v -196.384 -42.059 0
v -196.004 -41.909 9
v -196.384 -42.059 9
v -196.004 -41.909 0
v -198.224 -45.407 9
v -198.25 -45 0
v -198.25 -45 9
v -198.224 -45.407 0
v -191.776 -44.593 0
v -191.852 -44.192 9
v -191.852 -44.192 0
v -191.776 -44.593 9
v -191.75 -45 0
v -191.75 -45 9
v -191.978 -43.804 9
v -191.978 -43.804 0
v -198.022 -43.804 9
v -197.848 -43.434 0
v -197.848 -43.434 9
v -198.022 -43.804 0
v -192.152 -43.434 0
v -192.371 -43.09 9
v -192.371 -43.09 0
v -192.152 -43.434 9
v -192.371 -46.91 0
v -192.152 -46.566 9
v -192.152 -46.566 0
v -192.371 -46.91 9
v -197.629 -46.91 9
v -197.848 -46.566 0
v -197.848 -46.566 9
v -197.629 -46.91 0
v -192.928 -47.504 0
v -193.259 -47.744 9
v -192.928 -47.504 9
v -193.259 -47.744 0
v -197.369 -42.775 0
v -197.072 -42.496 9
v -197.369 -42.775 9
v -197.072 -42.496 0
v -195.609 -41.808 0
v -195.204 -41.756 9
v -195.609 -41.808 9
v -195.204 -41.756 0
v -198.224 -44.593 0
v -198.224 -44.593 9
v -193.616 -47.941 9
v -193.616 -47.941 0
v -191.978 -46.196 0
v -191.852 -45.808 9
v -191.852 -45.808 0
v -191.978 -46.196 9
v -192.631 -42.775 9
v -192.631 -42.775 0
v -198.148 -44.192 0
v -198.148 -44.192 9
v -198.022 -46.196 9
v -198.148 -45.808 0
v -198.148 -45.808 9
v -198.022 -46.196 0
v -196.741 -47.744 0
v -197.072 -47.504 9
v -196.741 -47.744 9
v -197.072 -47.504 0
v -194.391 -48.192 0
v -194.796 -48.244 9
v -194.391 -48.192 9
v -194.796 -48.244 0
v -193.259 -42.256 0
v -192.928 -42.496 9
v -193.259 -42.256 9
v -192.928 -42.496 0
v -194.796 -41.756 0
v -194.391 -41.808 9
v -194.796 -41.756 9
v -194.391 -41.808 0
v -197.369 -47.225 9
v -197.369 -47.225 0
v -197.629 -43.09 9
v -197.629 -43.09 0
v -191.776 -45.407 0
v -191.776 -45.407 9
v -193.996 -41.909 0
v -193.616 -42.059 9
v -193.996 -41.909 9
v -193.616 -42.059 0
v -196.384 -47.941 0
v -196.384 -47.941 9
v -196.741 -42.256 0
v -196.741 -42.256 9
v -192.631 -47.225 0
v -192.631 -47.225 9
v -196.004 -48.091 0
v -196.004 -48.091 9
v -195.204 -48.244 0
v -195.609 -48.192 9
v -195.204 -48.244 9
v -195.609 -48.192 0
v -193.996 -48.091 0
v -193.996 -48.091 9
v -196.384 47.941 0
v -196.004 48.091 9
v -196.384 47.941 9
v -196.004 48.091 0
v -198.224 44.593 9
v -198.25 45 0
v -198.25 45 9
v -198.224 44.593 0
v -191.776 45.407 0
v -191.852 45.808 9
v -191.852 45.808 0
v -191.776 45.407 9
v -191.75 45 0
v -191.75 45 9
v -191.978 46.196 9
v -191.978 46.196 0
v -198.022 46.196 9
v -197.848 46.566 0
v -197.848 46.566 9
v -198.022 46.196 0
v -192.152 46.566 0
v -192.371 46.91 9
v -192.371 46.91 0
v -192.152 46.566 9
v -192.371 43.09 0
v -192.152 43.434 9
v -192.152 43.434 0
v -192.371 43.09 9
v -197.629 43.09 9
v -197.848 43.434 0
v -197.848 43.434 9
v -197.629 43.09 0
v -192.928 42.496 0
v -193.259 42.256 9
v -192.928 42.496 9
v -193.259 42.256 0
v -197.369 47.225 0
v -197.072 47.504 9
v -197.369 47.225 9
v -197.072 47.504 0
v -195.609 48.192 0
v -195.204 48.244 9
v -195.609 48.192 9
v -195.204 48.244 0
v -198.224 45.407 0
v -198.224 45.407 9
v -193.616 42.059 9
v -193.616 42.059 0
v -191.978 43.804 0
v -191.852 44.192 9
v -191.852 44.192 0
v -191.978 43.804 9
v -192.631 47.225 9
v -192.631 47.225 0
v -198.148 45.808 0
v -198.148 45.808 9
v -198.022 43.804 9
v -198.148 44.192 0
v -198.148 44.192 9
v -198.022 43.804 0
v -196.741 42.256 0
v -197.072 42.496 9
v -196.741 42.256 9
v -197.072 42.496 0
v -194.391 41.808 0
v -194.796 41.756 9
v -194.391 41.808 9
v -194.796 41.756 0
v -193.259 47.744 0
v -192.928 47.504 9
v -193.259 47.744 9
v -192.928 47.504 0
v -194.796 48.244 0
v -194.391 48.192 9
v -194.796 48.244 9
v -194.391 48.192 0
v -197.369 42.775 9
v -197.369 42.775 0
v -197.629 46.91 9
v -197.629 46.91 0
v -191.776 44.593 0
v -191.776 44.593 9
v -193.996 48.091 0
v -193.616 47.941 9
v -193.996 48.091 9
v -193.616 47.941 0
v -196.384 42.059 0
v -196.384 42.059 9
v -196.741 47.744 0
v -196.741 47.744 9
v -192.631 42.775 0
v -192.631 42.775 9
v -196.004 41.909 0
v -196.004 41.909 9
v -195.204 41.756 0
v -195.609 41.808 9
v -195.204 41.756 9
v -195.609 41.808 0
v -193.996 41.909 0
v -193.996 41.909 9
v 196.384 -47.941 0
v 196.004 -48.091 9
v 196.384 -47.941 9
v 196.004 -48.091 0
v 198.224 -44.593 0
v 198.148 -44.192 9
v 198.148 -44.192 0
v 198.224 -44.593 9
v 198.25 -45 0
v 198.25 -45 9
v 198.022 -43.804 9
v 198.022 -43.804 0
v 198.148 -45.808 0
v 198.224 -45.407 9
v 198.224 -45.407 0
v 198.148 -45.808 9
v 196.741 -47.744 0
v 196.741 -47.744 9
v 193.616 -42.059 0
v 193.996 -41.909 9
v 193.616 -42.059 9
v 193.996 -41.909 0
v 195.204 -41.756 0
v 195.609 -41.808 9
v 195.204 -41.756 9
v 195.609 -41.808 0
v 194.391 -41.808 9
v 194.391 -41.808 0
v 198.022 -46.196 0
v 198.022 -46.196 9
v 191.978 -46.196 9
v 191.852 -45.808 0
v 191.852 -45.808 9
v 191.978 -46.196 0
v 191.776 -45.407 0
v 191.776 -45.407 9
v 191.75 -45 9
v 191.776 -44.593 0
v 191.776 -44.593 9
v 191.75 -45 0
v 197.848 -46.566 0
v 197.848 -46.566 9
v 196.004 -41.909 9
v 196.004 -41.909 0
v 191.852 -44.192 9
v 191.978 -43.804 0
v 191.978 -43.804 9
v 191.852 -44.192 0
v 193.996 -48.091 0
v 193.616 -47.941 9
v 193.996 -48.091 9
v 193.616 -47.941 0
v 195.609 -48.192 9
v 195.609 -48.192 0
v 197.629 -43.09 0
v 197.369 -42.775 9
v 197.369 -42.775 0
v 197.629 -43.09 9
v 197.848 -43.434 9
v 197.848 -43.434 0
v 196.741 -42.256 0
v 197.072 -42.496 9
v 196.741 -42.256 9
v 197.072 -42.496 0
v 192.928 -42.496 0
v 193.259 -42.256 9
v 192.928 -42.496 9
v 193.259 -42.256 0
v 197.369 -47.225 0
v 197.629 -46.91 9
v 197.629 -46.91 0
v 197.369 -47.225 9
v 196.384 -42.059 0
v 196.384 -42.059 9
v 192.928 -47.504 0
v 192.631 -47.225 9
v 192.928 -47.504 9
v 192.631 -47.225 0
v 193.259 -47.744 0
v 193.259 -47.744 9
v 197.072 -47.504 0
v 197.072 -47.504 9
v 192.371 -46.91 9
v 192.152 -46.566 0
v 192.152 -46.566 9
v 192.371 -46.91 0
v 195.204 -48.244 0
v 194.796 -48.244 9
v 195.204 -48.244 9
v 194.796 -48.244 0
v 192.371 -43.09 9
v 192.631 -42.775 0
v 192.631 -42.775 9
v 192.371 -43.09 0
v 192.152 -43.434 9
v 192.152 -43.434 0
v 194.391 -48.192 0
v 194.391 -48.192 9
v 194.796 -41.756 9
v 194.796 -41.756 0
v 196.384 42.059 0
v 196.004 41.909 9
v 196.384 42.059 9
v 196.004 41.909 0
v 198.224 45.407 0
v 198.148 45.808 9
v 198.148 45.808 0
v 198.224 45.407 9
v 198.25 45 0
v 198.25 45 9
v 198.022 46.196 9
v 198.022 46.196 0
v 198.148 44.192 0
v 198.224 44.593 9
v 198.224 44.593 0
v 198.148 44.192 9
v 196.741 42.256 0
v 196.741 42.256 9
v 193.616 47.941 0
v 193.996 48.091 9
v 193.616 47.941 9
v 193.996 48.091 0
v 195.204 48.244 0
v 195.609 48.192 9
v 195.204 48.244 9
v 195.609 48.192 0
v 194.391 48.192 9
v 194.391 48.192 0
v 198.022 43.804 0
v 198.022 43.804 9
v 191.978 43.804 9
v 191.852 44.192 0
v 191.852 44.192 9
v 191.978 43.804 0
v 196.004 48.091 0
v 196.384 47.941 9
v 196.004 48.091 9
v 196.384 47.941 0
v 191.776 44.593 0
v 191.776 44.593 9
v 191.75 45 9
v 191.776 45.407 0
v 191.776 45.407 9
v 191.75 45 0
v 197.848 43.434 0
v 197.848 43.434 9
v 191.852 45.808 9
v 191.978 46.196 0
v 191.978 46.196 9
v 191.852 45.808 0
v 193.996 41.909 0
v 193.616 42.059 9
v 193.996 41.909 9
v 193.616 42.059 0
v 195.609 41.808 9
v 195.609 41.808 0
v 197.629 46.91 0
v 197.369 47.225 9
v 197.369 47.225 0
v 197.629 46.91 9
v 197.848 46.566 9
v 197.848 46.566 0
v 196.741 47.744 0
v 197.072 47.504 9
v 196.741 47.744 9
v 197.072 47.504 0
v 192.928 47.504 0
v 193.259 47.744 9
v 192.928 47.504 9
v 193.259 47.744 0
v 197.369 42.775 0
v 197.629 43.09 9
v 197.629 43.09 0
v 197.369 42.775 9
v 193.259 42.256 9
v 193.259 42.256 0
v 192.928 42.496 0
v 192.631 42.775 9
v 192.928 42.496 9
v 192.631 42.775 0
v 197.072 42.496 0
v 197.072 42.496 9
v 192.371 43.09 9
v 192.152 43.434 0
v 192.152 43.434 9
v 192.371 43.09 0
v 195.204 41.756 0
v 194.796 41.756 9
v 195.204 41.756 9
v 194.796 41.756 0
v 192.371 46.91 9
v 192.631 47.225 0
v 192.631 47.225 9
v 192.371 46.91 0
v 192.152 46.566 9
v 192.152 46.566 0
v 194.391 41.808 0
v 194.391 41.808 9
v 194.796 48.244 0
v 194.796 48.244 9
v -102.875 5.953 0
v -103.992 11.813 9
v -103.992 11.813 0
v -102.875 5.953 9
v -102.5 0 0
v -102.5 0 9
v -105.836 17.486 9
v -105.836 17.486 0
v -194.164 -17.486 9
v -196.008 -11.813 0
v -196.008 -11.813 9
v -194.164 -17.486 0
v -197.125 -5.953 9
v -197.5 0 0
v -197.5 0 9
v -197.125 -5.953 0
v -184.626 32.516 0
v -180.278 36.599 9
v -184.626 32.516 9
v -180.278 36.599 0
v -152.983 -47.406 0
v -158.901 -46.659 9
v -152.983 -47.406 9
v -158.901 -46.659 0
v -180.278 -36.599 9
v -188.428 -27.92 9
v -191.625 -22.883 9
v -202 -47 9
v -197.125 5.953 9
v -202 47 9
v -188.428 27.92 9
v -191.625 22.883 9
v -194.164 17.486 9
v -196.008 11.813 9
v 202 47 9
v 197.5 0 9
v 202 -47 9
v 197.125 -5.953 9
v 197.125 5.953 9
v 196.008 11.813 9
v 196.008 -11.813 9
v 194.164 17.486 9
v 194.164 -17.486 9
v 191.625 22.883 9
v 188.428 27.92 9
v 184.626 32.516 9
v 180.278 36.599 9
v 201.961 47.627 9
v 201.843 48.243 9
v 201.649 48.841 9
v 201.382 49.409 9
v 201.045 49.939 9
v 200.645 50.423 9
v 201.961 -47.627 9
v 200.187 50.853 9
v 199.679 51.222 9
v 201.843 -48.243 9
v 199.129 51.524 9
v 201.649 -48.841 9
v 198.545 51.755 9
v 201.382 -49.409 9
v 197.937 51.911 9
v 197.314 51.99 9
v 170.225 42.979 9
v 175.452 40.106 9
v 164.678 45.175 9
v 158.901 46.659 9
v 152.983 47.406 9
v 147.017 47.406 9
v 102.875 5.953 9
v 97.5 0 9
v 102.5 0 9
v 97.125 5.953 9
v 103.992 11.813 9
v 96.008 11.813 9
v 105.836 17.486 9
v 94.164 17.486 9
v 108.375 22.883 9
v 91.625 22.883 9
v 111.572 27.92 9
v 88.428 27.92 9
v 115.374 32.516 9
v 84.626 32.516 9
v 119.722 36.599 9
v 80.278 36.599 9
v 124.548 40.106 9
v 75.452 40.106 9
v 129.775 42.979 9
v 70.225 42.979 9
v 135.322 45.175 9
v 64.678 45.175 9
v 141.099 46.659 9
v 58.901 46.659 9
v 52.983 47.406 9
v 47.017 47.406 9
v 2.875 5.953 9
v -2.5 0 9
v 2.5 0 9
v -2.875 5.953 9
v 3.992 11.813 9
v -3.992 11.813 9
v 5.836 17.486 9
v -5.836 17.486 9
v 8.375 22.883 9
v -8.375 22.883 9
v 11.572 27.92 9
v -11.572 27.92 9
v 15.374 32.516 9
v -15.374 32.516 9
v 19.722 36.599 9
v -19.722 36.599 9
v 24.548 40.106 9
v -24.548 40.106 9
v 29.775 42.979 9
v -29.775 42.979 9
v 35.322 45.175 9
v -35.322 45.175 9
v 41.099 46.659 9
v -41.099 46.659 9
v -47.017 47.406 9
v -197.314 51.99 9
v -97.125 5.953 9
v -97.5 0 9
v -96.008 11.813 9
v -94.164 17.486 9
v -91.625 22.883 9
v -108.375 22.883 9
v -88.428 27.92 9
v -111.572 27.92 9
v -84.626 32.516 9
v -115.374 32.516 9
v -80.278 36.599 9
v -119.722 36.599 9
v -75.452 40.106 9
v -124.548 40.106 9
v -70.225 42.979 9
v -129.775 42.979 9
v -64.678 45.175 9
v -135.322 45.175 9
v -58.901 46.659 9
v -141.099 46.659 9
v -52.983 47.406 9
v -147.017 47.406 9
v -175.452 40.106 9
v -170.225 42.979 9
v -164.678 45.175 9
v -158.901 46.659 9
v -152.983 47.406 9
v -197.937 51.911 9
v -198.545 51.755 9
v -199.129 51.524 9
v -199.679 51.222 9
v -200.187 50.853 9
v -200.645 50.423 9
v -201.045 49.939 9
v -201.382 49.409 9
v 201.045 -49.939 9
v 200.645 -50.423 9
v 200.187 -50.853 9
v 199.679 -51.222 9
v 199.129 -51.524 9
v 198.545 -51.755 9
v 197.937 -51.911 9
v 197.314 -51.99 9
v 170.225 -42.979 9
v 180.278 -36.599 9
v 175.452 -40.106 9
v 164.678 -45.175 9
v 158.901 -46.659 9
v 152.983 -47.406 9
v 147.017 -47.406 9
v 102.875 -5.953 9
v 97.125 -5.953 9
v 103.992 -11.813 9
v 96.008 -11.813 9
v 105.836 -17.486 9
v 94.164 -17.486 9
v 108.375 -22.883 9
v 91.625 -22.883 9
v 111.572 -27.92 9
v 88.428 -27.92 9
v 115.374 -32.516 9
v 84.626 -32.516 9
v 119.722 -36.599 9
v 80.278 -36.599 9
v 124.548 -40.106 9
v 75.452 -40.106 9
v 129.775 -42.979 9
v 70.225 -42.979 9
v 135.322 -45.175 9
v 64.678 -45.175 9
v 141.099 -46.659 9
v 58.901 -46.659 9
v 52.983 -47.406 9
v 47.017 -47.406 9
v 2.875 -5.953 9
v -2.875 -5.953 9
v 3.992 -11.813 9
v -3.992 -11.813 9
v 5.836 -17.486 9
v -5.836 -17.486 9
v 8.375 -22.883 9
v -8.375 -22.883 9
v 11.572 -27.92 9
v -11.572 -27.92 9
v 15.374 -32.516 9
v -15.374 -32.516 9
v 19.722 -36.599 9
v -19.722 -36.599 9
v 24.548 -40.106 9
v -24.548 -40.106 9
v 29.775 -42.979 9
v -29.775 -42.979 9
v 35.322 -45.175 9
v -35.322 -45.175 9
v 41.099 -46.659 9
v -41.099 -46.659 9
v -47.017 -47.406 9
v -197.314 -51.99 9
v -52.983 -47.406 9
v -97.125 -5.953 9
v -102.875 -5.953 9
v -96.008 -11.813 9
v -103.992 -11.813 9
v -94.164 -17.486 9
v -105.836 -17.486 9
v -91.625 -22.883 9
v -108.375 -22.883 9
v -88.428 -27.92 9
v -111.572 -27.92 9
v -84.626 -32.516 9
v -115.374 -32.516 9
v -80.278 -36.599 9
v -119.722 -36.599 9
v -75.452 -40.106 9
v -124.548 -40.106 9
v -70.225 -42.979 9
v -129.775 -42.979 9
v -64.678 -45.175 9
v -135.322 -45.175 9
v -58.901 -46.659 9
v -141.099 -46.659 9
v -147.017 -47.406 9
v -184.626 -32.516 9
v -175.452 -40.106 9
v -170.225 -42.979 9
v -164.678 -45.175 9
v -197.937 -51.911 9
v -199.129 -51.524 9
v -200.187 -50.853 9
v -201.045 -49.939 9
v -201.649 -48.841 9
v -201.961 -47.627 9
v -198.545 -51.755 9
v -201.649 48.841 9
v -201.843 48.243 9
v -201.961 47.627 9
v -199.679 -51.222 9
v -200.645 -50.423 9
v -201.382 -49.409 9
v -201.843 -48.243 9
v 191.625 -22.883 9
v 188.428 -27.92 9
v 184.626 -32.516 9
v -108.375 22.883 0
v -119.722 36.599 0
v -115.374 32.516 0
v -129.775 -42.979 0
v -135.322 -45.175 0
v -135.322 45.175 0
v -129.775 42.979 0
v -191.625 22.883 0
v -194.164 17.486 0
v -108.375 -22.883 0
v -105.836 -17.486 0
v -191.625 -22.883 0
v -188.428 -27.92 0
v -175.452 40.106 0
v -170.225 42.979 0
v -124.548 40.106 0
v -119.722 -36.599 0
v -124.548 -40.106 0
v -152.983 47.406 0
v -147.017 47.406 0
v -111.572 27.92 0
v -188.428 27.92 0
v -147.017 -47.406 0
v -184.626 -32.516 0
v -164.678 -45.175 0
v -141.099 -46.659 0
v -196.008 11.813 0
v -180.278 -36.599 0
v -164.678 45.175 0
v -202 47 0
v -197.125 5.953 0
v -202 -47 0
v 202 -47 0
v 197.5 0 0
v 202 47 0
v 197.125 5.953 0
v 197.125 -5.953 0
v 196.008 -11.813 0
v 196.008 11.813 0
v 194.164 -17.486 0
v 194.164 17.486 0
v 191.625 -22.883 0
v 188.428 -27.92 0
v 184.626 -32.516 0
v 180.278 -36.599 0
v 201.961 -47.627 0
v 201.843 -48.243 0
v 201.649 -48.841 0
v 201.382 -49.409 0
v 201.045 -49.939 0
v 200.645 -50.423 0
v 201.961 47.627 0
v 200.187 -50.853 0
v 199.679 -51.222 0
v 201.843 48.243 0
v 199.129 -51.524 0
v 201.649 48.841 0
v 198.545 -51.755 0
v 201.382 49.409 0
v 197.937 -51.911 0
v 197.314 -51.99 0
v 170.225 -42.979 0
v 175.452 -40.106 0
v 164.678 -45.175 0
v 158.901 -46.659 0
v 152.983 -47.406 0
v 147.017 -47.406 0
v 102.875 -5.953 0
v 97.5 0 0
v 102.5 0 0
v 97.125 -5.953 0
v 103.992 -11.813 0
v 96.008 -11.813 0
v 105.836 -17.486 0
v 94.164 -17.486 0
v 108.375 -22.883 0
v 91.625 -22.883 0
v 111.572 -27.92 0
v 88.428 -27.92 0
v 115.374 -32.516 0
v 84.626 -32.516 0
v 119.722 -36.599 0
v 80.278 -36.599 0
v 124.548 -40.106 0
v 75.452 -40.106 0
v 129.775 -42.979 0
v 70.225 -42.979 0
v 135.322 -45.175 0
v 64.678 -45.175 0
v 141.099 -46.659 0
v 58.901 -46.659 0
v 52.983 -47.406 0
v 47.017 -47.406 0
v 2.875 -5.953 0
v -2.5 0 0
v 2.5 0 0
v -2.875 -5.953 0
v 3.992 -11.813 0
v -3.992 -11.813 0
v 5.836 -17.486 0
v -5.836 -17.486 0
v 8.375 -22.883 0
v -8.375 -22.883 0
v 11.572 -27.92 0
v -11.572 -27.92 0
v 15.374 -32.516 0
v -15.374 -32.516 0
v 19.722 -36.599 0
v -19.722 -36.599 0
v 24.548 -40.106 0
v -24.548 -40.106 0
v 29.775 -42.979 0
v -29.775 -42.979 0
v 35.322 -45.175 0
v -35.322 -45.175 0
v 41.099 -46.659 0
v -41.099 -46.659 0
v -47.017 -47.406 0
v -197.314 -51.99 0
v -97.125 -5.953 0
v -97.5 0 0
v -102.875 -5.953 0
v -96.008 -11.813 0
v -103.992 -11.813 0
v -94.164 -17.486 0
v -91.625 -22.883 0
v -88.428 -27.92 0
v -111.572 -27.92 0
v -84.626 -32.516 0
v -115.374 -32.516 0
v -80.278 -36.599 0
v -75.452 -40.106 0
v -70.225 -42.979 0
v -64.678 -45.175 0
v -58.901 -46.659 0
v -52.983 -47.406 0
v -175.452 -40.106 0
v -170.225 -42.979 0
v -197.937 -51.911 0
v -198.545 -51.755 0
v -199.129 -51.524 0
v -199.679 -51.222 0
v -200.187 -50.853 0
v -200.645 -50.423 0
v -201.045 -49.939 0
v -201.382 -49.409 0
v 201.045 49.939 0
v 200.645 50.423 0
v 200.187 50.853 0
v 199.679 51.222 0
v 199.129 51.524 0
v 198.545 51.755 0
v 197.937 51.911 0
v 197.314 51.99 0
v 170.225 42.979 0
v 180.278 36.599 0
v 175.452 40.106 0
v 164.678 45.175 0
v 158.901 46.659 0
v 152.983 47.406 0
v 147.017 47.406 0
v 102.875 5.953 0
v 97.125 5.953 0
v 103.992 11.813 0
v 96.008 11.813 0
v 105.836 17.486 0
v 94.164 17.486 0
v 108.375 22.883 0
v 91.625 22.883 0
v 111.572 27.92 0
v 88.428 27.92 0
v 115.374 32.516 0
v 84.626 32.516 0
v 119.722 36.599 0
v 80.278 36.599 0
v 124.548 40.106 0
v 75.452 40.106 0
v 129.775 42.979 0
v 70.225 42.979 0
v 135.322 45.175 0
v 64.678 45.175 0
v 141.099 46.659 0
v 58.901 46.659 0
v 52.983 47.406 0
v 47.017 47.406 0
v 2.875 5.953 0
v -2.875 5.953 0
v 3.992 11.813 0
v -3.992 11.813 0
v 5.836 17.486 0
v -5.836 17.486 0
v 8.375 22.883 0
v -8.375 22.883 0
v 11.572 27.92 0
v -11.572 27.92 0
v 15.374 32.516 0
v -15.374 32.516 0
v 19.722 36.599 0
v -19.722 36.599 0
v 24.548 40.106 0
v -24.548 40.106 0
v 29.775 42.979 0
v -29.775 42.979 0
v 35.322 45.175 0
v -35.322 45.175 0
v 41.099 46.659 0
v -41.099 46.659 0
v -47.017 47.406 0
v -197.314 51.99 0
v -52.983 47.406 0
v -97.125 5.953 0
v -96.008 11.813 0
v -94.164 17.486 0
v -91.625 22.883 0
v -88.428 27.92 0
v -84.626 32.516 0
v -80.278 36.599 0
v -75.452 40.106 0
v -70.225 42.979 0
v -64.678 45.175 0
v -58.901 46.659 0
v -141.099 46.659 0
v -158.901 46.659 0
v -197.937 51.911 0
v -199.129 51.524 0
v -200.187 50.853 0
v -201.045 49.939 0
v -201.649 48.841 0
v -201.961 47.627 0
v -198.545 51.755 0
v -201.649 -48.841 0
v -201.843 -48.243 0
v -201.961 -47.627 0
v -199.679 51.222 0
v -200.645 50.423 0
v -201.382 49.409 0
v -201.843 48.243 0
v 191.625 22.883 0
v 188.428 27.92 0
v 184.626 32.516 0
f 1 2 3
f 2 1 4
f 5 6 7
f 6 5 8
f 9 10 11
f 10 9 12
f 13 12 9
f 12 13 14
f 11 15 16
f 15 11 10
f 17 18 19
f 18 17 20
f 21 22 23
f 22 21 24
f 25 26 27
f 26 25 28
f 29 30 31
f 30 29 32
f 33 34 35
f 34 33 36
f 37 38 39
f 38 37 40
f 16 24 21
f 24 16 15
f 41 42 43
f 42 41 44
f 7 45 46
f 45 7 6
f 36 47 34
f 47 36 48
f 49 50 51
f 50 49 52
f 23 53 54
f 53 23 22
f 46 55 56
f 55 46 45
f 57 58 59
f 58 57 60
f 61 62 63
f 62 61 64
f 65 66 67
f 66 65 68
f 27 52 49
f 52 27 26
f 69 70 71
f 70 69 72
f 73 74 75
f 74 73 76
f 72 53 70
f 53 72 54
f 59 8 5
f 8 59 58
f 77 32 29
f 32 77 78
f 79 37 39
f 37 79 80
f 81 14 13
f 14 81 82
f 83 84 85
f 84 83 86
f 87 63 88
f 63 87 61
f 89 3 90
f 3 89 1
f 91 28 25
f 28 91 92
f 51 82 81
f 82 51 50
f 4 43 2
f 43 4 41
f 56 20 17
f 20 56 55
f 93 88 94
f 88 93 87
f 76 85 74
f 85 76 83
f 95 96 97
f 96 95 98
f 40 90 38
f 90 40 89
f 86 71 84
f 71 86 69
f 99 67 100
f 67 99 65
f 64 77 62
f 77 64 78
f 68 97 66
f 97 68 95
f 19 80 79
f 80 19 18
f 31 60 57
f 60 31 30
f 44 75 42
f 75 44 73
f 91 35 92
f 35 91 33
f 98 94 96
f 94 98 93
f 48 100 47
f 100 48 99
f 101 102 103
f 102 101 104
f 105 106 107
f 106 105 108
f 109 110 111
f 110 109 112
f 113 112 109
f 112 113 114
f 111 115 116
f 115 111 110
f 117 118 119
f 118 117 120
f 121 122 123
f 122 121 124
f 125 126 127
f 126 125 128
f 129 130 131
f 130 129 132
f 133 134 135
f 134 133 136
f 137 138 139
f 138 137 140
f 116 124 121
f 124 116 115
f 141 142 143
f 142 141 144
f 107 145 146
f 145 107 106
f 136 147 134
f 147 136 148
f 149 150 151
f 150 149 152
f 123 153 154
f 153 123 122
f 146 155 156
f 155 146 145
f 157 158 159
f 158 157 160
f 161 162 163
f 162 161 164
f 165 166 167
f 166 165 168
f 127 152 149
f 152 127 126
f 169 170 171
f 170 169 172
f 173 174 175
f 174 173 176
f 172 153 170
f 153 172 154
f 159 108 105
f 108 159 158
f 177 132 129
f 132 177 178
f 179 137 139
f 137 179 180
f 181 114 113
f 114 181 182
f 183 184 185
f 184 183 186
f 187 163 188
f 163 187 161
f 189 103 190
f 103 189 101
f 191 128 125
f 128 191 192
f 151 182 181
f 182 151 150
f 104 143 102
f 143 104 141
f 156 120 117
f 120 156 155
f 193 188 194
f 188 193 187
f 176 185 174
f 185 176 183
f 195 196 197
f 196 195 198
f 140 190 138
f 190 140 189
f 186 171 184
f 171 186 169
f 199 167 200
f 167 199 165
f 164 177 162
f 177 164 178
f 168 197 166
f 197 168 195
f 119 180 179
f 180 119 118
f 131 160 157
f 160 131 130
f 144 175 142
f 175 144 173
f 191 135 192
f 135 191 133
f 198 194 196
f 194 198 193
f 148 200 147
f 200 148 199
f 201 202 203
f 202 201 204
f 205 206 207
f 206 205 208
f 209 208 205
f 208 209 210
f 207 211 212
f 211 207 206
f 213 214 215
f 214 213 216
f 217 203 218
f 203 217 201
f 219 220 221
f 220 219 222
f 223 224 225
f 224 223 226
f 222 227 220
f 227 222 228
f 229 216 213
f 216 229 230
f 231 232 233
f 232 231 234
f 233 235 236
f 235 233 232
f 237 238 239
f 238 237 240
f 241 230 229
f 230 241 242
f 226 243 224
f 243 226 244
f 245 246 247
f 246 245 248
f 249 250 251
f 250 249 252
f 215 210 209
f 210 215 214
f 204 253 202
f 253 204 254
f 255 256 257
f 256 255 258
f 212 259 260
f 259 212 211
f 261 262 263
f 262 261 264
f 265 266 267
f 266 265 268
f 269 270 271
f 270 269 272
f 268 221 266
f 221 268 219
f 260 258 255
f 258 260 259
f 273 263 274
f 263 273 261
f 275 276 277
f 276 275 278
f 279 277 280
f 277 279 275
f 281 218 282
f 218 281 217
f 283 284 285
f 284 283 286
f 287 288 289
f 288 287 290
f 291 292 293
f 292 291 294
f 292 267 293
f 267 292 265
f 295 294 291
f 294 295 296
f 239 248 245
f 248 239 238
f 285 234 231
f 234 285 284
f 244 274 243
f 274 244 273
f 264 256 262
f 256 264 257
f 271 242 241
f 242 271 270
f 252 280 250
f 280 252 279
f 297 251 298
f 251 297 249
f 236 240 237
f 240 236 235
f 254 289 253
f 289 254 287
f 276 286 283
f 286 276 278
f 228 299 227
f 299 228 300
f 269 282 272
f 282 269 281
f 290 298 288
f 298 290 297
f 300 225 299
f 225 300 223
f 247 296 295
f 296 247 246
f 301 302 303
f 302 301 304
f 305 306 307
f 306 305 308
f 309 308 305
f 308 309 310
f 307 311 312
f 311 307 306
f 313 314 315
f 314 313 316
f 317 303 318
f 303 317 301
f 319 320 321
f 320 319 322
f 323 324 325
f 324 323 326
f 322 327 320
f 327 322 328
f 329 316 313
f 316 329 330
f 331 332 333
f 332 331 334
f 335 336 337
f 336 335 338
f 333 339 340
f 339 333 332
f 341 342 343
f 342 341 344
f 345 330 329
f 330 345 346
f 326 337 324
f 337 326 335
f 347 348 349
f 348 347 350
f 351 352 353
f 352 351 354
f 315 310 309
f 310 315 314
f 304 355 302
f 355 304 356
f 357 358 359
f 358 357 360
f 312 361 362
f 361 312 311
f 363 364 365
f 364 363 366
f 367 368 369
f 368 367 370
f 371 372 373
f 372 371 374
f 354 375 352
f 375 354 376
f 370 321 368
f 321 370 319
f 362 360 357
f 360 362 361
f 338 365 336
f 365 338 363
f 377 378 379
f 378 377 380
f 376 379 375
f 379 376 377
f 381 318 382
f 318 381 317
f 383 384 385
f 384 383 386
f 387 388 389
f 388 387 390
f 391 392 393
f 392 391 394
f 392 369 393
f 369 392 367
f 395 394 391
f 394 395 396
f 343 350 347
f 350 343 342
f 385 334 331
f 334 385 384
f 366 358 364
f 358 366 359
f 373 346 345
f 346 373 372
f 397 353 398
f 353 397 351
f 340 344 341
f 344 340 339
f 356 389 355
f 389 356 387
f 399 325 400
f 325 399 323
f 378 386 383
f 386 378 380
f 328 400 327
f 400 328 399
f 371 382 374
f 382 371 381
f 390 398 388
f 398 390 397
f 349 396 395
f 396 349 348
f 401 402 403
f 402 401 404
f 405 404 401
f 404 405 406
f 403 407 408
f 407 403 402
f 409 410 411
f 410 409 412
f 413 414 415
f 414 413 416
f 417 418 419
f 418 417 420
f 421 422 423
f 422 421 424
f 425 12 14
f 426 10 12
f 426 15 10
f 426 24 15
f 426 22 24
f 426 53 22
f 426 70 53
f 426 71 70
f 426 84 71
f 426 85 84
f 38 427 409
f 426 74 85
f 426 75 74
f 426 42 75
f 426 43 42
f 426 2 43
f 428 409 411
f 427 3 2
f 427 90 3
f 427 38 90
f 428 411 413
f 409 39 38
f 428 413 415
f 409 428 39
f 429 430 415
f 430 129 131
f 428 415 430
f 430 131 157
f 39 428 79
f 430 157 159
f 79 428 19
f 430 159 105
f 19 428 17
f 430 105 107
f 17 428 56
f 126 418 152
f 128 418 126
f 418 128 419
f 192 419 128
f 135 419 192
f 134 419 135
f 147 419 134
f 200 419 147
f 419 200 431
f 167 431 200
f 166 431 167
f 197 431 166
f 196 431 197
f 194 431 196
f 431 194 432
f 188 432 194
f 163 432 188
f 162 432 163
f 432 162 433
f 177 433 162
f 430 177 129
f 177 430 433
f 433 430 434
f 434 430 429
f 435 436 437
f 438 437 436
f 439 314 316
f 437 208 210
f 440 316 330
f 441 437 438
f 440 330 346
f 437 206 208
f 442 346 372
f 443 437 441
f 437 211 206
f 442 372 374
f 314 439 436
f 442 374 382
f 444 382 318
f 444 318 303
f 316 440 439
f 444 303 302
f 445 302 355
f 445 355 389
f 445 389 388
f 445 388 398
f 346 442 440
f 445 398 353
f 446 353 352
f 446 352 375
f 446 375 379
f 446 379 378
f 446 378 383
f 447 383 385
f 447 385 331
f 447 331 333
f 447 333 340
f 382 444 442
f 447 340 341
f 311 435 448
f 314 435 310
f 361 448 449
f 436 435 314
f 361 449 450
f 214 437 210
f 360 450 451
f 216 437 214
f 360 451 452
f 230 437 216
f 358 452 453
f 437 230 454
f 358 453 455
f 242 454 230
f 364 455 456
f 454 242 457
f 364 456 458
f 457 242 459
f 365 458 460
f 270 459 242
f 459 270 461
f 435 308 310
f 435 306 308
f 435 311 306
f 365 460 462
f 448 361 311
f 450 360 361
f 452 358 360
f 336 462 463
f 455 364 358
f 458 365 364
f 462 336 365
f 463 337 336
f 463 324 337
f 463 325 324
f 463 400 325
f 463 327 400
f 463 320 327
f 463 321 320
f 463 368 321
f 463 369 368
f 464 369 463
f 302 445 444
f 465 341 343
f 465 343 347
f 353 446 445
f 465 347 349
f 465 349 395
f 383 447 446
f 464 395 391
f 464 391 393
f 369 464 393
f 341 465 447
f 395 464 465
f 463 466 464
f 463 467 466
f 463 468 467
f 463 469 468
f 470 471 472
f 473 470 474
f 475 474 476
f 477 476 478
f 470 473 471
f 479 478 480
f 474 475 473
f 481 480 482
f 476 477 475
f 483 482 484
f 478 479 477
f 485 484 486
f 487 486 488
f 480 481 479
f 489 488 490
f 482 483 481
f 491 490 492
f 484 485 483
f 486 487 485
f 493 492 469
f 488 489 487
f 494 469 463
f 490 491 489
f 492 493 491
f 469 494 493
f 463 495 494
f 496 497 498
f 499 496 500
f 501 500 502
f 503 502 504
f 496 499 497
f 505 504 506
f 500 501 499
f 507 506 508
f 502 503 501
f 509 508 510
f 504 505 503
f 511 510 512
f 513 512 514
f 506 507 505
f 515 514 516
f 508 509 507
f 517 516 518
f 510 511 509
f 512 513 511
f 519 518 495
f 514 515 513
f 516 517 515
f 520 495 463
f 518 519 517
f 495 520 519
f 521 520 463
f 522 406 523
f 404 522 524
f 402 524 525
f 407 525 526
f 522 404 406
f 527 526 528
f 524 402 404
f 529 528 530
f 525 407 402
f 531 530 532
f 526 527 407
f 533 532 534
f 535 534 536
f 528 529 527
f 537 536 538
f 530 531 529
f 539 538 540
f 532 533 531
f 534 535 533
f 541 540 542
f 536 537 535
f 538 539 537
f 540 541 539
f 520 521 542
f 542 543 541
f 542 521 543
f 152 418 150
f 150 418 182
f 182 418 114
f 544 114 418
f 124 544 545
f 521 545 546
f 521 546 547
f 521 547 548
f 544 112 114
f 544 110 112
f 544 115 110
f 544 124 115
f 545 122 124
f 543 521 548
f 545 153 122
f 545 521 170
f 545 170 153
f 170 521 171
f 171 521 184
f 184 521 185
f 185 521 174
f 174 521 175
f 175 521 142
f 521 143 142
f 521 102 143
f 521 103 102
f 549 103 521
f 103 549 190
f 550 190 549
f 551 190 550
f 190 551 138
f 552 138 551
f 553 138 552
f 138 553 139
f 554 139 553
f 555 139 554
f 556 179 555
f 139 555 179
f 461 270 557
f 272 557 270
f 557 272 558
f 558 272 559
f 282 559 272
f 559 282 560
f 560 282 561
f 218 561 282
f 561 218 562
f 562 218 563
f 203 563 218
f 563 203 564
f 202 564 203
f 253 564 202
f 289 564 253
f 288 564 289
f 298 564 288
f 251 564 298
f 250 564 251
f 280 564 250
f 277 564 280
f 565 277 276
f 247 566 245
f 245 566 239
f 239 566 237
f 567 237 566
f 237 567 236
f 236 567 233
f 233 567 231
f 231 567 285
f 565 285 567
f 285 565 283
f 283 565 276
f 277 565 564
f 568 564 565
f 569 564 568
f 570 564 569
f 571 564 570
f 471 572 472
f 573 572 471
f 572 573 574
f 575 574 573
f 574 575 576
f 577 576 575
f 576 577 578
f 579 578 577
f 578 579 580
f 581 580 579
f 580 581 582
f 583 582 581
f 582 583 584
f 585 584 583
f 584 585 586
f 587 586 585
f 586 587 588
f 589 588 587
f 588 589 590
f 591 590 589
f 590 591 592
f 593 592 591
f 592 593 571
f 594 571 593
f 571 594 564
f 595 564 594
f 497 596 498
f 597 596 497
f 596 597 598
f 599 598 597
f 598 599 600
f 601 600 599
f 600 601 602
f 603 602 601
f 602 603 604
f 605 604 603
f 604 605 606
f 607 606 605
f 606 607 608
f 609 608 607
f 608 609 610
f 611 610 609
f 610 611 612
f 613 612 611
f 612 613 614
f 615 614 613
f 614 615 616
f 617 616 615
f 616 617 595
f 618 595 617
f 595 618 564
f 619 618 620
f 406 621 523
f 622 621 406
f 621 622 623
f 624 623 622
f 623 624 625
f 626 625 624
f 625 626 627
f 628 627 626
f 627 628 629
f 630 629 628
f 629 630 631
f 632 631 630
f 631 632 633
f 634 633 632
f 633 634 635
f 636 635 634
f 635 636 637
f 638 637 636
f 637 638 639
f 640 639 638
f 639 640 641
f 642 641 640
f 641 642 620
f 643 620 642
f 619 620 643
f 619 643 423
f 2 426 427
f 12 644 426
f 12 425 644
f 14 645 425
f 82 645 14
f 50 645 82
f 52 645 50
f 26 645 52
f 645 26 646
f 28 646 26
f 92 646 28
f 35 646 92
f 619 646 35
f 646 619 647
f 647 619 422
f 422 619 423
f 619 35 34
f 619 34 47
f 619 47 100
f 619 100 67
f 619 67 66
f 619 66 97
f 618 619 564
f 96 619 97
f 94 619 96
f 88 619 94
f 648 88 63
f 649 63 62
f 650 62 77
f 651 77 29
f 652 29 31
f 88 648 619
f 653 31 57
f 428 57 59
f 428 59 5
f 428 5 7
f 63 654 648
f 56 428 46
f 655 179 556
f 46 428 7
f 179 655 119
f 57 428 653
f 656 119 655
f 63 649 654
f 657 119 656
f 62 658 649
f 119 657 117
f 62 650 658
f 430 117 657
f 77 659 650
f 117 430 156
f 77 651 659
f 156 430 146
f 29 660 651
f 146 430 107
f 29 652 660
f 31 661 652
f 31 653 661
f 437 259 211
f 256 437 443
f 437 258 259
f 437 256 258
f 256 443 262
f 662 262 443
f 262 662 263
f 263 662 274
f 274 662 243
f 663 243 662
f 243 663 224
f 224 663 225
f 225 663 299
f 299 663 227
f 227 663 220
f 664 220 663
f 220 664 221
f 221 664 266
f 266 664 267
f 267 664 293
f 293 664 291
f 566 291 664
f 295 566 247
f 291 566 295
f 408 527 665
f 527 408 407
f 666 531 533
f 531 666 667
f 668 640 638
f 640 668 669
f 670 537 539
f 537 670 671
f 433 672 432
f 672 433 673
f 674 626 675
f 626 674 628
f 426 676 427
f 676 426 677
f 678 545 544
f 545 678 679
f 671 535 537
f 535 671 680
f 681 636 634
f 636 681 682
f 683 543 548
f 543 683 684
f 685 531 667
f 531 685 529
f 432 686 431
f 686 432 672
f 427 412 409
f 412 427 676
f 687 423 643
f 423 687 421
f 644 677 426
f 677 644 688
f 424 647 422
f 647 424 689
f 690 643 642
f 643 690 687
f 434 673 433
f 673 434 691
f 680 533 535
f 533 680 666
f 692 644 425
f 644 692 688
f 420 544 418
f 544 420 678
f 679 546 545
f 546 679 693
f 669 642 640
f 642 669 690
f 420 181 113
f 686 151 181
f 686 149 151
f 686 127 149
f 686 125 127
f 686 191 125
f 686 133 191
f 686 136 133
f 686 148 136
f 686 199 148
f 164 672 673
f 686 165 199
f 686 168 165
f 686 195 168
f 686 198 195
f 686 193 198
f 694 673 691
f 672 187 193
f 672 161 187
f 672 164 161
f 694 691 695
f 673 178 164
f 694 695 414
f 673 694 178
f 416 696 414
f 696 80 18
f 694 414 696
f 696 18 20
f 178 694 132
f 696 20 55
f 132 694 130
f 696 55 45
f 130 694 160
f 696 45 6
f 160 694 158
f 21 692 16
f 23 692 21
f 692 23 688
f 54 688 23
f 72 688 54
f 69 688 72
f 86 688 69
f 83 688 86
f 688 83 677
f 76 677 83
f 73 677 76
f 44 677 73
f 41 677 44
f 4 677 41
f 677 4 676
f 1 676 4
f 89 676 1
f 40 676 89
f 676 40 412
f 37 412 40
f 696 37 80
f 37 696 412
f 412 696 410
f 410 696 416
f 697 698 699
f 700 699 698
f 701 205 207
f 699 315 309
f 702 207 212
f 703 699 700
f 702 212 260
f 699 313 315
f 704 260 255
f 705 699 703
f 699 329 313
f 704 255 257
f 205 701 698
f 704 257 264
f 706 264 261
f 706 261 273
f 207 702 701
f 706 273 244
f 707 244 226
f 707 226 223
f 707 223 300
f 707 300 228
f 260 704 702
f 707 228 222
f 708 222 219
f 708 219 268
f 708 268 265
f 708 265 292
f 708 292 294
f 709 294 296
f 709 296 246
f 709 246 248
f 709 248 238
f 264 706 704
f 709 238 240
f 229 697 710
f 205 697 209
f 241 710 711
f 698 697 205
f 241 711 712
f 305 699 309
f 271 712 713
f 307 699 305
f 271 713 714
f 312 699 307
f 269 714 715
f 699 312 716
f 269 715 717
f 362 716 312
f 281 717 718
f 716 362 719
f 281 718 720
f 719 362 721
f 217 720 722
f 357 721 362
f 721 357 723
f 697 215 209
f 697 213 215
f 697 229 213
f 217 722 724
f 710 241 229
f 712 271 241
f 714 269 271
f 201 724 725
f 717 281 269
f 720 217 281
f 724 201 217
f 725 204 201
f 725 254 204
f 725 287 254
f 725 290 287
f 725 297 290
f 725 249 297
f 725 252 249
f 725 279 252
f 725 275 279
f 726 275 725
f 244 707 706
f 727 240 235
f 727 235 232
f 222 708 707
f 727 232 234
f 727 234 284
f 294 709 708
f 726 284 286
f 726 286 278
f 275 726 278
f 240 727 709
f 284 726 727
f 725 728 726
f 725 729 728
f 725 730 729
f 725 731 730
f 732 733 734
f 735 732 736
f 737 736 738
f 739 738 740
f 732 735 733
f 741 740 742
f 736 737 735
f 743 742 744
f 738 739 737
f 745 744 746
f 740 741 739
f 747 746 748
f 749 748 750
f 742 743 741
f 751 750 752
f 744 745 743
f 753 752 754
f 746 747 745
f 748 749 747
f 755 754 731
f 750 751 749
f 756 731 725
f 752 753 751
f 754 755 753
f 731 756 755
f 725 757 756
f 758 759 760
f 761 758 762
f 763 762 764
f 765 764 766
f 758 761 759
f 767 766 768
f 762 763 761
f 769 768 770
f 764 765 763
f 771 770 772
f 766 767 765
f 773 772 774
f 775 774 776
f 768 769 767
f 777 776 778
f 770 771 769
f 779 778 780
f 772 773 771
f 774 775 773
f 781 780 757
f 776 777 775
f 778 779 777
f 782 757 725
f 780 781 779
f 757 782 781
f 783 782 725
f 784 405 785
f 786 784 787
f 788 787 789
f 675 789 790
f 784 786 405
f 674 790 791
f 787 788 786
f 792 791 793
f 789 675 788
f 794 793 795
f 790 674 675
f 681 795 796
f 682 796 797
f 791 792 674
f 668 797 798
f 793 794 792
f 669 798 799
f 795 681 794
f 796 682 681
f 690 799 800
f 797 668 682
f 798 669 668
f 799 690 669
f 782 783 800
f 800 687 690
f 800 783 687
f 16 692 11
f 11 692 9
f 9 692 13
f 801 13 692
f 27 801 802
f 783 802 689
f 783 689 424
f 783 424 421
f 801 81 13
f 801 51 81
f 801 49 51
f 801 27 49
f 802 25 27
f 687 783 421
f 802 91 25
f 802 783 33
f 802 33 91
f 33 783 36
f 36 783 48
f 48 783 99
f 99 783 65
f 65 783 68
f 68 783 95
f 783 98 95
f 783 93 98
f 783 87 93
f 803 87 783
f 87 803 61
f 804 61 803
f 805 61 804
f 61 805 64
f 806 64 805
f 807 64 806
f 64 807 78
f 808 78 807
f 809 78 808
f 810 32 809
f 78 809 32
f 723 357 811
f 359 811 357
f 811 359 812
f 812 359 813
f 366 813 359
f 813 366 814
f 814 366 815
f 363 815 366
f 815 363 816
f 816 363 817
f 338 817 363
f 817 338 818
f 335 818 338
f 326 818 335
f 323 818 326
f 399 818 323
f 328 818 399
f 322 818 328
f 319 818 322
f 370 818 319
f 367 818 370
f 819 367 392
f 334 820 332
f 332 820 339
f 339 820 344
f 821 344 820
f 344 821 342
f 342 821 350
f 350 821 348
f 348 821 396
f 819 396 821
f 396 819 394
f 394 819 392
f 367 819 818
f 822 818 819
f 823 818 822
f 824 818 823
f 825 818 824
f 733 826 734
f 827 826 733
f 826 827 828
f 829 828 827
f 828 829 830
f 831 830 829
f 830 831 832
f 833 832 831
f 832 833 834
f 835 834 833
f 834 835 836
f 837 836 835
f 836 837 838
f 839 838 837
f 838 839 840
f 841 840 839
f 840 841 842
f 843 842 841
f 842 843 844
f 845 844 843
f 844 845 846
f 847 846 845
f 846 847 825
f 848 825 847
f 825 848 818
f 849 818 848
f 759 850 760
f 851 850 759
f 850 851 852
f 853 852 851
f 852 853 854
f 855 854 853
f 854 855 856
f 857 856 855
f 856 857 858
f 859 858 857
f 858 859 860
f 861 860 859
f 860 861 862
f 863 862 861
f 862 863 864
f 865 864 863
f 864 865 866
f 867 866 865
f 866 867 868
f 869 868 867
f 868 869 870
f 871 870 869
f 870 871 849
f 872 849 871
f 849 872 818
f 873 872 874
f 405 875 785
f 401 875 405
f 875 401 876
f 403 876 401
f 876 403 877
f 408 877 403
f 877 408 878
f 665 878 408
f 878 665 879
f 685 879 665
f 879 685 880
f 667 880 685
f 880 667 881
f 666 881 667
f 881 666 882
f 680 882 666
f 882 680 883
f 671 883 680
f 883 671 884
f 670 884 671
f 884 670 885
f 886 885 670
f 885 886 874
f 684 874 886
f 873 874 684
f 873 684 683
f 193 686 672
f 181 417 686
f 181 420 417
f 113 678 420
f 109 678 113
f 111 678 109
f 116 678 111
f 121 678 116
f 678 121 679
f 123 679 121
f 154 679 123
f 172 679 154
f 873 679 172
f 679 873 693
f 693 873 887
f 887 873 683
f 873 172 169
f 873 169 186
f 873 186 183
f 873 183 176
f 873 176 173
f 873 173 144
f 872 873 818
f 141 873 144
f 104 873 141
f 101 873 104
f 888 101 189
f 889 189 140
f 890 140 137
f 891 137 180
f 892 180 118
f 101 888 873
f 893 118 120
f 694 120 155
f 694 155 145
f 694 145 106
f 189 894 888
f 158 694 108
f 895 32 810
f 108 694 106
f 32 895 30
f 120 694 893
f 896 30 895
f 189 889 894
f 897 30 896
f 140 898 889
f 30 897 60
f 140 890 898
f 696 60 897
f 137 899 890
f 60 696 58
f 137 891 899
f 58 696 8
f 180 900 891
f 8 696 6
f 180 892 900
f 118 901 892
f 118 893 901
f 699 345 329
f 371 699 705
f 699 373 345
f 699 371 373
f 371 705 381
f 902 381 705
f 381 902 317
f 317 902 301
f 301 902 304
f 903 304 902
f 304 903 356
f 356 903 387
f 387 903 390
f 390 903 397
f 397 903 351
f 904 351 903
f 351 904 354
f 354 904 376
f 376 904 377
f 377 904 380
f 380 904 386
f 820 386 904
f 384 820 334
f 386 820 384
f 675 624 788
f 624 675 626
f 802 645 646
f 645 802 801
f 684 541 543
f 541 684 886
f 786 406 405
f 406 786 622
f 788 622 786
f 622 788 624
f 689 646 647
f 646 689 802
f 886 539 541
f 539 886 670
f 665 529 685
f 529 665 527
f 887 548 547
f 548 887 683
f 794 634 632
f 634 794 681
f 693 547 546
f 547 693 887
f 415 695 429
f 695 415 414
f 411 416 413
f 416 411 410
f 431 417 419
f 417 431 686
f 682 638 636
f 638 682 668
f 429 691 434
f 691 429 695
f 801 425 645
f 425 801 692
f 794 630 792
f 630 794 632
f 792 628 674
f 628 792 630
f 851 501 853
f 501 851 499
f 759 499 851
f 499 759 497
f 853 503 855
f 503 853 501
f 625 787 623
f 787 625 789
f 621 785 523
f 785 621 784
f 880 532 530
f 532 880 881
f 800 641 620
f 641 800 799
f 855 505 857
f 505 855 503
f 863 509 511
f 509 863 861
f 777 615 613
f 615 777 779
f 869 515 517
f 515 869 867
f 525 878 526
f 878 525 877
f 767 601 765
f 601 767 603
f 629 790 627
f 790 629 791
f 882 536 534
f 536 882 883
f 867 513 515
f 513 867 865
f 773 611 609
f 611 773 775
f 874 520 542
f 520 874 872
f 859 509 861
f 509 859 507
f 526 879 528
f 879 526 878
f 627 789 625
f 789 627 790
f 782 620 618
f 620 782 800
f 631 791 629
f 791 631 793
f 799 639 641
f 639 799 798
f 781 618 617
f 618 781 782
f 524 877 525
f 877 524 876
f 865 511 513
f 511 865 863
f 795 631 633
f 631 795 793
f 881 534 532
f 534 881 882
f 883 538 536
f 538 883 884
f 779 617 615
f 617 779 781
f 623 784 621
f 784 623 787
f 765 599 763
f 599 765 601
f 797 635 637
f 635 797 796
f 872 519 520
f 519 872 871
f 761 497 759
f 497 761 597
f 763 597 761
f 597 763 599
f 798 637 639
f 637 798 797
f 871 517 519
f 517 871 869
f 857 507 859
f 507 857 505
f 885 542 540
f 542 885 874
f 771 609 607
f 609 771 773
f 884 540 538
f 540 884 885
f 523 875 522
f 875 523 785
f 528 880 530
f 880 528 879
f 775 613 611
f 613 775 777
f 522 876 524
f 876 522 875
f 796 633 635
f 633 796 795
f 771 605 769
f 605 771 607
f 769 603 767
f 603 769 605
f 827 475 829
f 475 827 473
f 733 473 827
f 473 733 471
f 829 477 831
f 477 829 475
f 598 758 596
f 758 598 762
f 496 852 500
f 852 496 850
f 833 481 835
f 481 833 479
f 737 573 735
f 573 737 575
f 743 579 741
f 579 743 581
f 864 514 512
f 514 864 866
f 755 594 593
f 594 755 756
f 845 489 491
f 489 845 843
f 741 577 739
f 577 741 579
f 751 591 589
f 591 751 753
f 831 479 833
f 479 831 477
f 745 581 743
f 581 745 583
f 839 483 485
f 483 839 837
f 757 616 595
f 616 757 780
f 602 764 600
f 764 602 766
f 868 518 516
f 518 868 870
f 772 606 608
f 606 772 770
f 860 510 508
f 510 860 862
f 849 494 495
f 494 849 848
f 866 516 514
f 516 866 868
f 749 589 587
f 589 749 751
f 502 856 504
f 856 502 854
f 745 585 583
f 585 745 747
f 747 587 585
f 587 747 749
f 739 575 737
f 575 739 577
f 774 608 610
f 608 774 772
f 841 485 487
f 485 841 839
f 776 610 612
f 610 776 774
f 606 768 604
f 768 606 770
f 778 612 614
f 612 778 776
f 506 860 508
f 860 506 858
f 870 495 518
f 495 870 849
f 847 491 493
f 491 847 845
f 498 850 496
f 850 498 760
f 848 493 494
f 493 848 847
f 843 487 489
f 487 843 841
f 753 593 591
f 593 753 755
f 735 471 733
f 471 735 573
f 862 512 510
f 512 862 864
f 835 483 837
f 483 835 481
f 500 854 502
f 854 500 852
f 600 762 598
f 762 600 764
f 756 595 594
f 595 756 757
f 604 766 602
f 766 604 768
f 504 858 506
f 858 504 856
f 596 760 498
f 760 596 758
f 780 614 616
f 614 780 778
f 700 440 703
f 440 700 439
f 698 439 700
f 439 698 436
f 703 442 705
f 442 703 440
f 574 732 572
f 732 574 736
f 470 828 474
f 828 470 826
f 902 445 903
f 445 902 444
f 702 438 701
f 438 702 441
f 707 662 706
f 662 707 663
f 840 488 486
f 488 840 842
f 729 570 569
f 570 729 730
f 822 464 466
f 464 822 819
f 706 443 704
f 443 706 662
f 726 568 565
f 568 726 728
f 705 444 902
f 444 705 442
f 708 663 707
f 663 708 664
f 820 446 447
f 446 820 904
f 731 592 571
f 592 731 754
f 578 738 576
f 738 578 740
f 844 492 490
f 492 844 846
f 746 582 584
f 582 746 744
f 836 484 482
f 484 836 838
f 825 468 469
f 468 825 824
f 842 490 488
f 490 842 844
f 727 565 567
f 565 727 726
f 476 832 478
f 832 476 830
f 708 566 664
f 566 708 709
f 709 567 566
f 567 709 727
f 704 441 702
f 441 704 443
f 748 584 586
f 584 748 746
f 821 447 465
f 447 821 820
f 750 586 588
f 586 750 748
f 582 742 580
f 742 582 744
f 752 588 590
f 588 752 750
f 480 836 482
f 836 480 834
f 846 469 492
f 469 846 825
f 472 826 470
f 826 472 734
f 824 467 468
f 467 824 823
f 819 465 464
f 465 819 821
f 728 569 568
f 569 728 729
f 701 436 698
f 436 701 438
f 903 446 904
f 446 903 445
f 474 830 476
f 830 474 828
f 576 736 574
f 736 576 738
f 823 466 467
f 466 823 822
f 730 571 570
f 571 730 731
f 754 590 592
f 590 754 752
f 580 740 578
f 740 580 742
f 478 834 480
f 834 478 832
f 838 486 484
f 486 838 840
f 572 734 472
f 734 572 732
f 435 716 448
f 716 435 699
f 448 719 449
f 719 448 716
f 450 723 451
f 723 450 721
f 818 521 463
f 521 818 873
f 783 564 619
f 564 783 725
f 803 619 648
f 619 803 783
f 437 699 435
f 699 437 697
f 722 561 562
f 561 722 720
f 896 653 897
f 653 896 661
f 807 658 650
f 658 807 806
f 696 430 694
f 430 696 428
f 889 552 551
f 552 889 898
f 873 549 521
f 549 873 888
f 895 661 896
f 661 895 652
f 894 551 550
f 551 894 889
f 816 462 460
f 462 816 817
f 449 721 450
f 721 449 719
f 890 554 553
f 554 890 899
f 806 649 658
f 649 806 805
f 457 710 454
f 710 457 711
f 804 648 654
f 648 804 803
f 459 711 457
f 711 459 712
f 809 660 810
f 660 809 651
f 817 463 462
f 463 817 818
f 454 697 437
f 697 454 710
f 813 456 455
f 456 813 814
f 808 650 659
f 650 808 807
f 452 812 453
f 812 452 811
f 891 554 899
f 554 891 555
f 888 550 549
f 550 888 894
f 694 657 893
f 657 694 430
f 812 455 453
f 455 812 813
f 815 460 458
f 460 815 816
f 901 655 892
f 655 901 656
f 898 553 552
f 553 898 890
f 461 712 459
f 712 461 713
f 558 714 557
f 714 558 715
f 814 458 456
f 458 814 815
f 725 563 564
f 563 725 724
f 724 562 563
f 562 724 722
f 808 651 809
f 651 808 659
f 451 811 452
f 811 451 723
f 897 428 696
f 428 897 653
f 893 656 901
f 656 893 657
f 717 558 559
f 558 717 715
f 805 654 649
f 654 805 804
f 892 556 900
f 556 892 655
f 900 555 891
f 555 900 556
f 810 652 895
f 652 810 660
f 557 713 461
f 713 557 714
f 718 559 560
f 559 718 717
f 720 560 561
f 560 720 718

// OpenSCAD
$fn = 50;


difference() {
	union() {
		hull() {
			translate(v = [-197.0000000000, 47.0000000000, 0]) {
				cylinder(h = 9, r = 5);
			}
			translate(v = [197.0000000000, 47.0000000000, 0]) {
				cylinder(h = 9, r = 5);
			}
			translate(v = [-197.0000000000, -47.0000000000, 0]) {
				cylinder(h = 9, r = 5);
			}
			translate(v = [197.0000000000, -47.0000000000, 0]) {
				cylinder(h = 9, r = 5);
			}
		}
	}
	union() {
		#translate(v = [-195.0000000000, -45.0000000000, -100.0000000000]) {
			cylinder(h = 200, r = 3.2500000000);
		}
		#translate(v = [-195.0000000000, 45.0000000000, -100.0000000000]) {
			cylinder(h = 200, r = 3.2500000000);
		}
		#translate(v = [195.0000000000, -45.0000000000, -100.0000000000]) {
			cylinder(h = 200, r = 3.2500000000);
		}
		#translate(v = [195.0000000000, 45.0000000000, -100.0000000000]) {
			cylinder(h = 200, r = 3.2500000000);
		}
		#translate(v = [-150.0000000000, 0, 0]) {
			cylinder(h = 9, r = 47.5000000000);
		}
		#translate(v = [-50.0000000000, 0, 0]) {
			cylinder(h = 9, r = 47.5000000000);
		}
		#translate(v = [50.0000000000, 0, 0]) {
			cylinder(h = 9, r = 47.5000000000);
		}
		#translate(v = [150.0000000000, 0, 0]) {
			cylinder(h = 9, r = 47.5000000000);
		}
	}
}
